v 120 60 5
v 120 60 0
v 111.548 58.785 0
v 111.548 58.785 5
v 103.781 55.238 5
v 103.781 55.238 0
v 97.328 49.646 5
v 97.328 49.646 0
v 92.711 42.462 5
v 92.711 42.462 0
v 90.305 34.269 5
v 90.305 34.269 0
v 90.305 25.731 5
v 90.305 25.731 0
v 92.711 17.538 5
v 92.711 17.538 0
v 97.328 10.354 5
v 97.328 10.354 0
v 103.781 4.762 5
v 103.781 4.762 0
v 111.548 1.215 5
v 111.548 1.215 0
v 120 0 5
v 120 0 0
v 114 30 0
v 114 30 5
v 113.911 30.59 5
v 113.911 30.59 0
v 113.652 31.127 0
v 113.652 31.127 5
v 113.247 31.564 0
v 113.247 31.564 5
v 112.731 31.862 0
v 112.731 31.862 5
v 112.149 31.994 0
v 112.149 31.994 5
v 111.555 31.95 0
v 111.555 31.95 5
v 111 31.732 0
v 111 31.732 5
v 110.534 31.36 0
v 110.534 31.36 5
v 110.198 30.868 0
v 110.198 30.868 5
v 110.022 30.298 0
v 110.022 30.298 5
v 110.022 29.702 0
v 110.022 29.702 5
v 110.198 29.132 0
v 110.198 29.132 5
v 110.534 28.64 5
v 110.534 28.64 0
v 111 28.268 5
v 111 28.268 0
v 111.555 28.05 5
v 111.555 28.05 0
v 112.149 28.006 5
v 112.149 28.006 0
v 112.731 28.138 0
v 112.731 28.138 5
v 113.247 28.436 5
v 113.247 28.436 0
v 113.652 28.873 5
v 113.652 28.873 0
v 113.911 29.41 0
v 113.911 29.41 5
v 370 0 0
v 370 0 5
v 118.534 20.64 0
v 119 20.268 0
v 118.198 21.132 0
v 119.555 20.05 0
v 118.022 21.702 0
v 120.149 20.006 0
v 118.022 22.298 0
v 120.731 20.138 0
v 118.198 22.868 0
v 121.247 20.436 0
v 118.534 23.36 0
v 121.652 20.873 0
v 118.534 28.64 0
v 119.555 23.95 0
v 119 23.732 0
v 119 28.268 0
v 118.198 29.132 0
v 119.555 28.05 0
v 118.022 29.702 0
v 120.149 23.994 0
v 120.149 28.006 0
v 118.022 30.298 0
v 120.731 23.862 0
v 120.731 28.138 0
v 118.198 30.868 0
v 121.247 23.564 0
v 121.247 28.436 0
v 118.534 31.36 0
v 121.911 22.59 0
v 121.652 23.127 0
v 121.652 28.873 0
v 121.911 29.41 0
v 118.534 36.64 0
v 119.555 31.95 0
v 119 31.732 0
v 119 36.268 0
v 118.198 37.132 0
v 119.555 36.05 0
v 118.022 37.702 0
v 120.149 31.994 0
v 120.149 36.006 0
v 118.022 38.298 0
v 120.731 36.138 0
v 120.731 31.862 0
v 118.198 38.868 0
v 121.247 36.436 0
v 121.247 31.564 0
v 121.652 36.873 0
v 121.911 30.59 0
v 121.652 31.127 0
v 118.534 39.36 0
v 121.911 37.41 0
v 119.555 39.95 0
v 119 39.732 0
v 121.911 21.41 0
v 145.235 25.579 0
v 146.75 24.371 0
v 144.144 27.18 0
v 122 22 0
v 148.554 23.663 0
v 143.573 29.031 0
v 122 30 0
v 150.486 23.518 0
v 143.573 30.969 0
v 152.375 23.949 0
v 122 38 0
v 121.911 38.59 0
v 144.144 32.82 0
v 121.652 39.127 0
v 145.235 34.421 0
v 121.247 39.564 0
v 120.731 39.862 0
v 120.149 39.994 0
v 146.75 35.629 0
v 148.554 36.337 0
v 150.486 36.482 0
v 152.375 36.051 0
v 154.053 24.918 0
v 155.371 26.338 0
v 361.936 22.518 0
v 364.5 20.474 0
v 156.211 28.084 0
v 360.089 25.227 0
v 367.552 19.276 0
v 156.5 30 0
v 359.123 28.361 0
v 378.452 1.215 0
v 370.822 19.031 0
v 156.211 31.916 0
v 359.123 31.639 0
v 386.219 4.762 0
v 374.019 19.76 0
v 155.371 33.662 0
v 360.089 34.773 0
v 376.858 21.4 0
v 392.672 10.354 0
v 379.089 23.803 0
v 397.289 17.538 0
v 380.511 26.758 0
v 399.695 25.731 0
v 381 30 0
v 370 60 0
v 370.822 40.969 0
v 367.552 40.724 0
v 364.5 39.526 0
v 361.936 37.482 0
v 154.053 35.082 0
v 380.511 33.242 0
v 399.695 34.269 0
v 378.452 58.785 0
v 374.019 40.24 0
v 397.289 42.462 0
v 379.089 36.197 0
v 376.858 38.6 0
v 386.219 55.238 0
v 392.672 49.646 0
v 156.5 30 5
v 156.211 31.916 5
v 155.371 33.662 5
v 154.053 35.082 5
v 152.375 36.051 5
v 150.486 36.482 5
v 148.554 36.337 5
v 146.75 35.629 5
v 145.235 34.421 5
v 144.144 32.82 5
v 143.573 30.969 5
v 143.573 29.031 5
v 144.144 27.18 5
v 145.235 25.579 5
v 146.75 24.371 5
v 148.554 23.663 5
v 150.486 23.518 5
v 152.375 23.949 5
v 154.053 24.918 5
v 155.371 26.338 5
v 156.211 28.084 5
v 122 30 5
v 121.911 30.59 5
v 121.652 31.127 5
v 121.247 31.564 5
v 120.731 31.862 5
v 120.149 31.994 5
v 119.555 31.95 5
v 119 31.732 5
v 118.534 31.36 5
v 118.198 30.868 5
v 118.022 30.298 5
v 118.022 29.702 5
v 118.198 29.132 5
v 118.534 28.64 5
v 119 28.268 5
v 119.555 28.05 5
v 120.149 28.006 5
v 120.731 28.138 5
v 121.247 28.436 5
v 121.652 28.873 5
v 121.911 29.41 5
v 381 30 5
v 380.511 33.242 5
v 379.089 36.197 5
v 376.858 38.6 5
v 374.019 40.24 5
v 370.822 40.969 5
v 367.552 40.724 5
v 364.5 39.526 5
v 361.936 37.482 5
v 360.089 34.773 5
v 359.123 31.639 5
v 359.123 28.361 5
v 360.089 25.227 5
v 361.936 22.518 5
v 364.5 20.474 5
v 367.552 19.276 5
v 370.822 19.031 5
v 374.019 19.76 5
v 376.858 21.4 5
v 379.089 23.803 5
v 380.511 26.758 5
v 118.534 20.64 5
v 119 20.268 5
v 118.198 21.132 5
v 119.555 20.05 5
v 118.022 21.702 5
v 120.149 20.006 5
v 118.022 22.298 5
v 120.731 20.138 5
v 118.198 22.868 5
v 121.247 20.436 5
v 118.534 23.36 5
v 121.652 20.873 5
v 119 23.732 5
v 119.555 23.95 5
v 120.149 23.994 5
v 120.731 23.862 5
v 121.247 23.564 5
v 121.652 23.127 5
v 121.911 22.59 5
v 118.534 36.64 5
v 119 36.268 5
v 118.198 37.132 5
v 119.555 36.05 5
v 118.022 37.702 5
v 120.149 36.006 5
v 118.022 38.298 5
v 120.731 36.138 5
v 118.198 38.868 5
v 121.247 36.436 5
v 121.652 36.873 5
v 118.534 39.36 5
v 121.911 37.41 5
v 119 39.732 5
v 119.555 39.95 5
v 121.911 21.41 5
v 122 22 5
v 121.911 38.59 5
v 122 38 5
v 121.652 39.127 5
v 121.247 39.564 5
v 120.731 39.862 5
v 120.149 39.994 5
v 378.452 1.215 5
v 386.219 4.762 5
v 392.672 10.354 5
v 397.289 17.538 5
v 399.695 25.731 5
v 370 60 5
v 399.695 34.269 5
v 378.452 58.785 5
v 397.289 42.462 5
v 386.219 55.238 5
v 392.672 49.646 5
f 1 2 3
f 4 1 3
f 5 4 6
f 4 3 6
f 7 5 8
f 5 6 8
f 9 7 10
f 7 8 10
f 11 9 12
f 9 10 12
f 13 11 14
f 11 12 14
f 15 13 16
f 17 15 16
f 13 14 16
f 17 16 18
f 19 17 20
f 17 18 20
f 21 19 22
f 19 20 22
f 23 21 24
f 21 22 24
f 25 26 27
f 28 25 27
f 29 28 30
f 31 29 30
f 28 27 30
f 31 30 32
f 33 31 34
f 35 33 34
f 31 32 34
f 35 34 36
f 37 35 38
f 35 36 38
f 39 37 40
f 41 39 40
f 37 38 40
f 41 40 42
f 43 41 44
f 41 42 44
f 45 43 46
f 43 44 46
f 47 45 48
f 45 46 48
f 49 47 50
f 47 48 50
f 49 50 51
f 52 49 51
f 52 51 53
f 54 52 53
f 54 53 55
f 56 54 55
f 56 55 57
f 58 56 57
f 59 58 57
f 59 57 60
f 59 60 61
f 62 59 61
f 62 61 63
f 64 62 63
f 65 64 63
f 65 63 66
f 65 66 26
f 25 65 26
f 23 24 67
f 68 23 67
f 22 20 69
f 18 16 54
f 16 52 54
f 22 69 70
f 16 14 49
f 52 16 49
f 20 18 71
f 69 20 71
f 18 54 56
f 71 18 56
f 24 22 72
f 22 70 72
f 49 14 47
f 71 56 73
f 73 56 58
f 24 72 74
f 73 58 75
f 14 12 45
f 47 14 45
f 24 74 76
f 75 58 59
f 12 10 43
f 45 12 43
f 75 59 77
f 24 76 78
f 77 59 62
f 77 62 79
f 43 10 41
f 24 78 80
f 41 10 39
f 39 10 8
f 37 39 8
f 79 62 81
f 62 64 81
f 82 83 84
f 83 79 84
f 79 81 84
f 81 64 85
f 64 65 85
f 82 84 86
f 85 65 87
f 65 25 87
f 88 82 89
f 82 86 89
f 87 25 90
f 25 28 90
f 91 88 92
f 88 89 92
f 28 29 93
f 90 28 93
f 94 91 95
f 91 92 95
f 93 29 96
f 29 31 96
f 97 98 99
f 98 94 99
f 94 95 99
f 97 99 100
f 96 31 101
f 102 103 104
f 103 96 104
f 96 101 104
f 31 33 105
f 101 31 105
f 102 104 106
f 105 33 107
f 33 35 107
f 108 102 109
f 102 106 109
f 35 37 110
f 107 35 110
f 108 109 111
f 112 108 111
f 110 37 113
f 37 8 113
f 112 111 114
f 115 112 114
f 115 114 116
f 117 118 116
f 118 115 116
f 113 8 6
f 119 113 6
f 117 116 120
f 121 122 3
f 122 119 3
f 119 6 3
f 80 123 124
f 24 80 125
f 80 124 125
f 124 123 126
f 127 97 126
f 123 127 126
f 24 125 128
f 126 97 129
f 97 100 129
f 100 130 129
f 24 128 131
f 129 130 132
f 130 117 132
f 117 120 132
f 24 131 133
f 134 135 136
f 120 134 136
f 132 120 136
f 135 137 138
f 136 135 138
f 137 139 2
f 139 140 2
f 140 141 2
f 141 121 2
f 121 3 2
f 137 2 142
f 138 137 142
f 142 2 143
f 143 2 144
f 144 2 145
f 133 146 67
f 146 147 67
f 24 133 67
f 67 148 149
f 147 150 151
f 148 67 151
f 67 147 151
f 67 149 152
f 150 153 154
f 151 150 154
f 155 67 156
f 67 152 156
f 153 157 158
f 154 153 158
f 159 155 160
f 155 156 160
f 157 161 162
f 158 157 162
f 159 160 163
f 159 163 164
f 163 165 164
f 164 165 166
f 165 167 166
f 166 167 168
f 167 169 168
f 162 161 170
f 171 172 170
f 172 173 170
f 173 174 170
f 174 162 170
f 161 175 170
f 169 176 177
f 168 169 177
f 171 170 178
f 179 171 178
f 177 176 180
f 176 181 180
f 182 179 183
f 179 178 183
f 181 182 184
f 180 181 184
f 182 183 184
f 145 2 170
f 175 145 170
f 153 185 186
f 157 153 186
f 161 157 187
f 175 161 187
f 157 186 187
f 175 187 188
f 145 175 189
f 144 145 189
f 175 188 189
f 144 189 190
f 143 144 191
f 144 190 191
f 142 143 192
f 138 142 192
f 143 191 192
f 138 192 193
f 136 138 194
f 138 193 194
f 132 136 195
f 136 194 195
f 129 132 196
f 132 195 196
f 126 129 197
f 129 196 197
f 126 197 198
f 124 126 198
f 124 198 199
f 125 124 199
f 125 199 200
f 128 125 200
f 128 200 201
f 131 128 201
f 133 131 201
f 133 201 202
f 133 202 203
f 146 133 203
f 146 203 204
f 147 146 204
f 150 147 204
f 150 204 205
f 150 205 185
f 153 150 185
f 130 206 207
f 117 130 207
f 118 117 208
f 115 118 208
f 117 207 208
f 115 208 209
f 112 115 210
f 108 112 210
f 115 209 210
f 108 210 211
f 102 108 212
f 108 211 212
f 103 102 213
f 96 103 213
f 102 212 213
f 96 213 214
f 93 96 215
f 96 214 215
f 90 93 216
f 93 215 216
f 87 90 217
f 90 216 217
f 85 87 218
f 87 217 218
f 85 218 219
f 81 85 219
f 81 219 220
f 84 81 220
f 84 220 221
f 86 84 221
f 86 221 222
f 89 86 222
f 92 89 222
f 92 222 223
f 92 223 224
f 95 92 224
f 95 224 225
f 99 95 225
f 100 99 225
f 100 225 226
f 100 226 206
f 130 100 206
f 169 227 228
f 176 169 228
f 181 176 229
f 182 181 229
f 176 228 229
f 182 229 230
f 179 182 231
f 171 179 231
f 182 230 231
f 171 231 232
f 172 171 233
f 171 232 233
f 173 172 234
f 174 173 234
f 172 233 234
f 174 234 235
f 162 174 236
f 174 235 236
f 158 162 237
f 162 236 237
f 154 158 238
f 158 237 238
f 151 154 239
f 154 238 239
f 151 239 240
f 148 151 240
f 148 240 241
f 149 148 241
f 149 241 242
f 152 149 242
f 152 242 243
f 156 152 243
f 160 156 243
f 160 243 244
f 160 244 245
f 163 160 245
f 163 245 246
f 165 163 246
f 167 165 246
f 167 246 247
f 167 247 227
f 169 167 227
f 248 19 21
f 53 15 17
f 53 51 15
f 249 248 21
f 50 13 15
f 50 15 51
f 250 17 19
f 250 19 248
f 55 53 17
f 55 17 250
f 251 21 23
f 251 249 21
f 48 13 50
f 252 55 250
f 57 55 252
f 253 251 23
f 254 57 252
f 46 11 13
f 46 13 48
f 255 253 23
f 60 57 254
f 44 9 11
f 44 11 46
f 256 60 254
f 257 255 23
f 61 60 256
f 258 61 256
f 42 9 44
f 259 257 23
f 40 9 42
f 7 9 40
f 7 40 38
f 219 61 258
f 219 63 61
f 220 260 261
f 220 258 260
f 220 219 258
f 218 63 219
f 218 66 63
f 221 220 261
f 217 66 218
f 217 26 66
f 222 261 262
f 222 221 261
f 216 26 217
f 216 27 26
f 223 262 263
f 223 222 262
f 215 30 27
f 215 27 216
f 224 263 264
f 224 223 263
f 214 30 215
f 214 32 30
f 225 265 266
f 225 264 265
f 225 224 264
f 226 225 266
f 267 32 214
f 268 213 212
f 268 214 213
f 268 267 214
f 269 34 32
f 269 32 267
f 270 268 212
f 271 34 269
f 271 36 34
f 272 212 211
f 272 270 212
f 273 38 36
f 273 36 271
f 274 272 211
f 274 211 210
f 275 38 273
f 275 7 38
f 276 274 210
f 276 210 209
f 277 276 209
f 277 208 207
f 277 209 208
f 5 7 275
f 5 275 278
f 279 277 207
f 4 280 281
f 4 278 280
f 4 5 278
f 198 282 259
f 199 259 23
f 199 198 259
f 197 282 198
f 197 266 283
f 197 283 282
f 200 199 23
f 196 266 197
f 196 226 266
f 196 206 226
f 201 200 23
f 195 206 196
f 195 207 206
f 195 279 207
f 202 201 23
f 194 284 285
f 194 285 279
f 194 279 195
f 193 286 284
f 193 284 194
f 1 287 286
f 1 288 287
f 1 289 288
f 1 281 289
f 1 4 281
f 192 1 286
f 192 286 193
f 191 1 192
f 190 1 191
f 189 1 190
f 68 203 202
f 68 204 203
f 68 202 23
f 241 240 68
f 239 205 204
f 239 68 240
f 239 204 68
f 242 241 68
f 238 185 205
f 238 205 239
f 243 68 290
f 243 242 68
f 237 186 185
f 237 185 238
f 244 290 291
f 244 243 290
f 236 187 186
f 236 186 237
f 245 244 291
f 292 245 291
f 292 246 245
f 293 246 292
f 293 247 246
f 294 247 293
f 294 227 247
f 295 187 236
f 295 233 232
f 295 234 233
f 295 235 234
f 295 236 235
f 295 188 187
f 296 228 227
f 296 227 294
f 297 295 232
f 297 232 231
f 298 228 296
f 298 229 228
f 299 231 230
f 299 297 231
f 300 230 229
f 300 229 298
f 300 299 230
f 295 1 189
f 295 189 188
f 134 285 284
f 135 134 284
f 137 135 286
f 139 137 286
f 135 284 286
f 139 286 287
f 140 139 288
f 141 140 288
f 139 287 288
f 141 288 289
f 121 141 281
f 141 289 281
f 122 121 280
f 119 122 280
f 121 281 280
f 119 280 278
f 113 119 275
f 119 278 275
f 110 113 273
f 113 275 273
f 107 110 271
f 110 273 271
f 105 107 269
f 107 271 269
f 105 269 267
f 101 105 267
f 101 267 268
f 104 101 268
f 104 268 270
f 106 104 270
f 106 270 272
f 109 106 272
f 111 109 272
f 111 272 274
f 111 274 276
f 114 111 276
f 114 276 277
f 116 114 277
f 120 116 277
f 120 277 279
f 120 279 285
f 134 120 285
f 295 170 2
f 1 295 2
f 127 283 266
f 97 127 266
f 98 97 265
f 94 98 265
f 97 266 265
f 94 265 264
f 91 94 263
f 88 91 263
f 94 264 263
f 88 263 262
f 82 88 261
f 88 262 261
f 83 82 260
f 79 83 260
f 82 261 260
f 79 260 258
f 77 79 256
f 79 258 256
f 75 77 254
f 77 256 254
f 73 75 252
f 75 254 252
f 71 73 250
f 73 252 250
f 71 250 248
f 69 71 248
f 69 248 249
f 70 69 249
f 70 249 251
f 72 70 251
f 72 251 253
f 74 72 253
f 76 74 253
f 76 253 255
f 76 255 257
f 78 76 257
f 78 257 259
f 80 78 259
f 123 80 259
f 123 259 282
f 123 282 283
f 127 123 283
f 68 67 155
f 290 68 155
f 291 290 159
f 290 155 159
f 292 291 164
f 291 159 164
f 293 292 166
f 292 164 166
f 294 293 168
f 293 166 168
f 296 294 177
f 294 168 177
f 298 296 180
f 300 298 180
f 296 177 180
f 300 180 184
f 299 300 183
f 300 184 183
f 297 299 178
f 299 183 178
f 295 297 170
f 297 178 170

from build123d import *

# Parameters (mm, degrees)
SALIENTE_EXTRUIR1_DEPTH = 5
CROQUIS2_R              = 11
CROQUIS2_R_2            = 6.5
CROQUIS2_R_3            = 2
CORTAR_EXTRUIR4_DEPTH   = 220


with BuildPart() as part:
    # Croquis1 → Saliente-Extruir1 (new body)
    with BuildSketch(Plane.XY):
        with BuildLine():
            Line((120, 0), (370, 0))
            ThreePointArc((370, 0), (400, 30), (370, 60))
            Line((370, 60), (120, 60))
            ThreePointArc((120, 60), (90, 30), (120, 0))
        make_face()
    extrude(amount=SALIENTE_EXTRUIR1_DEPTH)

    # Croquis2 → Cortar-Extruir4 (cut)
    with BuildSketch(Plane.XY.offset(5)):
        with Locations((370, 30)):
            Circle(CROQUIS2_R)
        with Locations((150, 30)):
            Circle(CROQUIS2_R_2)
        with Locations((120, 30)):
            Circle(CROQUIS2_R_3)
        with Locations((120, 22)):
            Circle(CROQUIS2_R_3)
        with Locations((120, 38)):
            Circle(CROQUIS2_R_3)
        with Locations((112, 30)):
            Circle(CROQUIS2_R_3)
    extrude(amount=-CORTAR_EXTRUIR4_DEPTH, mode=Mode.SUBTRACT)


solid = part.part
